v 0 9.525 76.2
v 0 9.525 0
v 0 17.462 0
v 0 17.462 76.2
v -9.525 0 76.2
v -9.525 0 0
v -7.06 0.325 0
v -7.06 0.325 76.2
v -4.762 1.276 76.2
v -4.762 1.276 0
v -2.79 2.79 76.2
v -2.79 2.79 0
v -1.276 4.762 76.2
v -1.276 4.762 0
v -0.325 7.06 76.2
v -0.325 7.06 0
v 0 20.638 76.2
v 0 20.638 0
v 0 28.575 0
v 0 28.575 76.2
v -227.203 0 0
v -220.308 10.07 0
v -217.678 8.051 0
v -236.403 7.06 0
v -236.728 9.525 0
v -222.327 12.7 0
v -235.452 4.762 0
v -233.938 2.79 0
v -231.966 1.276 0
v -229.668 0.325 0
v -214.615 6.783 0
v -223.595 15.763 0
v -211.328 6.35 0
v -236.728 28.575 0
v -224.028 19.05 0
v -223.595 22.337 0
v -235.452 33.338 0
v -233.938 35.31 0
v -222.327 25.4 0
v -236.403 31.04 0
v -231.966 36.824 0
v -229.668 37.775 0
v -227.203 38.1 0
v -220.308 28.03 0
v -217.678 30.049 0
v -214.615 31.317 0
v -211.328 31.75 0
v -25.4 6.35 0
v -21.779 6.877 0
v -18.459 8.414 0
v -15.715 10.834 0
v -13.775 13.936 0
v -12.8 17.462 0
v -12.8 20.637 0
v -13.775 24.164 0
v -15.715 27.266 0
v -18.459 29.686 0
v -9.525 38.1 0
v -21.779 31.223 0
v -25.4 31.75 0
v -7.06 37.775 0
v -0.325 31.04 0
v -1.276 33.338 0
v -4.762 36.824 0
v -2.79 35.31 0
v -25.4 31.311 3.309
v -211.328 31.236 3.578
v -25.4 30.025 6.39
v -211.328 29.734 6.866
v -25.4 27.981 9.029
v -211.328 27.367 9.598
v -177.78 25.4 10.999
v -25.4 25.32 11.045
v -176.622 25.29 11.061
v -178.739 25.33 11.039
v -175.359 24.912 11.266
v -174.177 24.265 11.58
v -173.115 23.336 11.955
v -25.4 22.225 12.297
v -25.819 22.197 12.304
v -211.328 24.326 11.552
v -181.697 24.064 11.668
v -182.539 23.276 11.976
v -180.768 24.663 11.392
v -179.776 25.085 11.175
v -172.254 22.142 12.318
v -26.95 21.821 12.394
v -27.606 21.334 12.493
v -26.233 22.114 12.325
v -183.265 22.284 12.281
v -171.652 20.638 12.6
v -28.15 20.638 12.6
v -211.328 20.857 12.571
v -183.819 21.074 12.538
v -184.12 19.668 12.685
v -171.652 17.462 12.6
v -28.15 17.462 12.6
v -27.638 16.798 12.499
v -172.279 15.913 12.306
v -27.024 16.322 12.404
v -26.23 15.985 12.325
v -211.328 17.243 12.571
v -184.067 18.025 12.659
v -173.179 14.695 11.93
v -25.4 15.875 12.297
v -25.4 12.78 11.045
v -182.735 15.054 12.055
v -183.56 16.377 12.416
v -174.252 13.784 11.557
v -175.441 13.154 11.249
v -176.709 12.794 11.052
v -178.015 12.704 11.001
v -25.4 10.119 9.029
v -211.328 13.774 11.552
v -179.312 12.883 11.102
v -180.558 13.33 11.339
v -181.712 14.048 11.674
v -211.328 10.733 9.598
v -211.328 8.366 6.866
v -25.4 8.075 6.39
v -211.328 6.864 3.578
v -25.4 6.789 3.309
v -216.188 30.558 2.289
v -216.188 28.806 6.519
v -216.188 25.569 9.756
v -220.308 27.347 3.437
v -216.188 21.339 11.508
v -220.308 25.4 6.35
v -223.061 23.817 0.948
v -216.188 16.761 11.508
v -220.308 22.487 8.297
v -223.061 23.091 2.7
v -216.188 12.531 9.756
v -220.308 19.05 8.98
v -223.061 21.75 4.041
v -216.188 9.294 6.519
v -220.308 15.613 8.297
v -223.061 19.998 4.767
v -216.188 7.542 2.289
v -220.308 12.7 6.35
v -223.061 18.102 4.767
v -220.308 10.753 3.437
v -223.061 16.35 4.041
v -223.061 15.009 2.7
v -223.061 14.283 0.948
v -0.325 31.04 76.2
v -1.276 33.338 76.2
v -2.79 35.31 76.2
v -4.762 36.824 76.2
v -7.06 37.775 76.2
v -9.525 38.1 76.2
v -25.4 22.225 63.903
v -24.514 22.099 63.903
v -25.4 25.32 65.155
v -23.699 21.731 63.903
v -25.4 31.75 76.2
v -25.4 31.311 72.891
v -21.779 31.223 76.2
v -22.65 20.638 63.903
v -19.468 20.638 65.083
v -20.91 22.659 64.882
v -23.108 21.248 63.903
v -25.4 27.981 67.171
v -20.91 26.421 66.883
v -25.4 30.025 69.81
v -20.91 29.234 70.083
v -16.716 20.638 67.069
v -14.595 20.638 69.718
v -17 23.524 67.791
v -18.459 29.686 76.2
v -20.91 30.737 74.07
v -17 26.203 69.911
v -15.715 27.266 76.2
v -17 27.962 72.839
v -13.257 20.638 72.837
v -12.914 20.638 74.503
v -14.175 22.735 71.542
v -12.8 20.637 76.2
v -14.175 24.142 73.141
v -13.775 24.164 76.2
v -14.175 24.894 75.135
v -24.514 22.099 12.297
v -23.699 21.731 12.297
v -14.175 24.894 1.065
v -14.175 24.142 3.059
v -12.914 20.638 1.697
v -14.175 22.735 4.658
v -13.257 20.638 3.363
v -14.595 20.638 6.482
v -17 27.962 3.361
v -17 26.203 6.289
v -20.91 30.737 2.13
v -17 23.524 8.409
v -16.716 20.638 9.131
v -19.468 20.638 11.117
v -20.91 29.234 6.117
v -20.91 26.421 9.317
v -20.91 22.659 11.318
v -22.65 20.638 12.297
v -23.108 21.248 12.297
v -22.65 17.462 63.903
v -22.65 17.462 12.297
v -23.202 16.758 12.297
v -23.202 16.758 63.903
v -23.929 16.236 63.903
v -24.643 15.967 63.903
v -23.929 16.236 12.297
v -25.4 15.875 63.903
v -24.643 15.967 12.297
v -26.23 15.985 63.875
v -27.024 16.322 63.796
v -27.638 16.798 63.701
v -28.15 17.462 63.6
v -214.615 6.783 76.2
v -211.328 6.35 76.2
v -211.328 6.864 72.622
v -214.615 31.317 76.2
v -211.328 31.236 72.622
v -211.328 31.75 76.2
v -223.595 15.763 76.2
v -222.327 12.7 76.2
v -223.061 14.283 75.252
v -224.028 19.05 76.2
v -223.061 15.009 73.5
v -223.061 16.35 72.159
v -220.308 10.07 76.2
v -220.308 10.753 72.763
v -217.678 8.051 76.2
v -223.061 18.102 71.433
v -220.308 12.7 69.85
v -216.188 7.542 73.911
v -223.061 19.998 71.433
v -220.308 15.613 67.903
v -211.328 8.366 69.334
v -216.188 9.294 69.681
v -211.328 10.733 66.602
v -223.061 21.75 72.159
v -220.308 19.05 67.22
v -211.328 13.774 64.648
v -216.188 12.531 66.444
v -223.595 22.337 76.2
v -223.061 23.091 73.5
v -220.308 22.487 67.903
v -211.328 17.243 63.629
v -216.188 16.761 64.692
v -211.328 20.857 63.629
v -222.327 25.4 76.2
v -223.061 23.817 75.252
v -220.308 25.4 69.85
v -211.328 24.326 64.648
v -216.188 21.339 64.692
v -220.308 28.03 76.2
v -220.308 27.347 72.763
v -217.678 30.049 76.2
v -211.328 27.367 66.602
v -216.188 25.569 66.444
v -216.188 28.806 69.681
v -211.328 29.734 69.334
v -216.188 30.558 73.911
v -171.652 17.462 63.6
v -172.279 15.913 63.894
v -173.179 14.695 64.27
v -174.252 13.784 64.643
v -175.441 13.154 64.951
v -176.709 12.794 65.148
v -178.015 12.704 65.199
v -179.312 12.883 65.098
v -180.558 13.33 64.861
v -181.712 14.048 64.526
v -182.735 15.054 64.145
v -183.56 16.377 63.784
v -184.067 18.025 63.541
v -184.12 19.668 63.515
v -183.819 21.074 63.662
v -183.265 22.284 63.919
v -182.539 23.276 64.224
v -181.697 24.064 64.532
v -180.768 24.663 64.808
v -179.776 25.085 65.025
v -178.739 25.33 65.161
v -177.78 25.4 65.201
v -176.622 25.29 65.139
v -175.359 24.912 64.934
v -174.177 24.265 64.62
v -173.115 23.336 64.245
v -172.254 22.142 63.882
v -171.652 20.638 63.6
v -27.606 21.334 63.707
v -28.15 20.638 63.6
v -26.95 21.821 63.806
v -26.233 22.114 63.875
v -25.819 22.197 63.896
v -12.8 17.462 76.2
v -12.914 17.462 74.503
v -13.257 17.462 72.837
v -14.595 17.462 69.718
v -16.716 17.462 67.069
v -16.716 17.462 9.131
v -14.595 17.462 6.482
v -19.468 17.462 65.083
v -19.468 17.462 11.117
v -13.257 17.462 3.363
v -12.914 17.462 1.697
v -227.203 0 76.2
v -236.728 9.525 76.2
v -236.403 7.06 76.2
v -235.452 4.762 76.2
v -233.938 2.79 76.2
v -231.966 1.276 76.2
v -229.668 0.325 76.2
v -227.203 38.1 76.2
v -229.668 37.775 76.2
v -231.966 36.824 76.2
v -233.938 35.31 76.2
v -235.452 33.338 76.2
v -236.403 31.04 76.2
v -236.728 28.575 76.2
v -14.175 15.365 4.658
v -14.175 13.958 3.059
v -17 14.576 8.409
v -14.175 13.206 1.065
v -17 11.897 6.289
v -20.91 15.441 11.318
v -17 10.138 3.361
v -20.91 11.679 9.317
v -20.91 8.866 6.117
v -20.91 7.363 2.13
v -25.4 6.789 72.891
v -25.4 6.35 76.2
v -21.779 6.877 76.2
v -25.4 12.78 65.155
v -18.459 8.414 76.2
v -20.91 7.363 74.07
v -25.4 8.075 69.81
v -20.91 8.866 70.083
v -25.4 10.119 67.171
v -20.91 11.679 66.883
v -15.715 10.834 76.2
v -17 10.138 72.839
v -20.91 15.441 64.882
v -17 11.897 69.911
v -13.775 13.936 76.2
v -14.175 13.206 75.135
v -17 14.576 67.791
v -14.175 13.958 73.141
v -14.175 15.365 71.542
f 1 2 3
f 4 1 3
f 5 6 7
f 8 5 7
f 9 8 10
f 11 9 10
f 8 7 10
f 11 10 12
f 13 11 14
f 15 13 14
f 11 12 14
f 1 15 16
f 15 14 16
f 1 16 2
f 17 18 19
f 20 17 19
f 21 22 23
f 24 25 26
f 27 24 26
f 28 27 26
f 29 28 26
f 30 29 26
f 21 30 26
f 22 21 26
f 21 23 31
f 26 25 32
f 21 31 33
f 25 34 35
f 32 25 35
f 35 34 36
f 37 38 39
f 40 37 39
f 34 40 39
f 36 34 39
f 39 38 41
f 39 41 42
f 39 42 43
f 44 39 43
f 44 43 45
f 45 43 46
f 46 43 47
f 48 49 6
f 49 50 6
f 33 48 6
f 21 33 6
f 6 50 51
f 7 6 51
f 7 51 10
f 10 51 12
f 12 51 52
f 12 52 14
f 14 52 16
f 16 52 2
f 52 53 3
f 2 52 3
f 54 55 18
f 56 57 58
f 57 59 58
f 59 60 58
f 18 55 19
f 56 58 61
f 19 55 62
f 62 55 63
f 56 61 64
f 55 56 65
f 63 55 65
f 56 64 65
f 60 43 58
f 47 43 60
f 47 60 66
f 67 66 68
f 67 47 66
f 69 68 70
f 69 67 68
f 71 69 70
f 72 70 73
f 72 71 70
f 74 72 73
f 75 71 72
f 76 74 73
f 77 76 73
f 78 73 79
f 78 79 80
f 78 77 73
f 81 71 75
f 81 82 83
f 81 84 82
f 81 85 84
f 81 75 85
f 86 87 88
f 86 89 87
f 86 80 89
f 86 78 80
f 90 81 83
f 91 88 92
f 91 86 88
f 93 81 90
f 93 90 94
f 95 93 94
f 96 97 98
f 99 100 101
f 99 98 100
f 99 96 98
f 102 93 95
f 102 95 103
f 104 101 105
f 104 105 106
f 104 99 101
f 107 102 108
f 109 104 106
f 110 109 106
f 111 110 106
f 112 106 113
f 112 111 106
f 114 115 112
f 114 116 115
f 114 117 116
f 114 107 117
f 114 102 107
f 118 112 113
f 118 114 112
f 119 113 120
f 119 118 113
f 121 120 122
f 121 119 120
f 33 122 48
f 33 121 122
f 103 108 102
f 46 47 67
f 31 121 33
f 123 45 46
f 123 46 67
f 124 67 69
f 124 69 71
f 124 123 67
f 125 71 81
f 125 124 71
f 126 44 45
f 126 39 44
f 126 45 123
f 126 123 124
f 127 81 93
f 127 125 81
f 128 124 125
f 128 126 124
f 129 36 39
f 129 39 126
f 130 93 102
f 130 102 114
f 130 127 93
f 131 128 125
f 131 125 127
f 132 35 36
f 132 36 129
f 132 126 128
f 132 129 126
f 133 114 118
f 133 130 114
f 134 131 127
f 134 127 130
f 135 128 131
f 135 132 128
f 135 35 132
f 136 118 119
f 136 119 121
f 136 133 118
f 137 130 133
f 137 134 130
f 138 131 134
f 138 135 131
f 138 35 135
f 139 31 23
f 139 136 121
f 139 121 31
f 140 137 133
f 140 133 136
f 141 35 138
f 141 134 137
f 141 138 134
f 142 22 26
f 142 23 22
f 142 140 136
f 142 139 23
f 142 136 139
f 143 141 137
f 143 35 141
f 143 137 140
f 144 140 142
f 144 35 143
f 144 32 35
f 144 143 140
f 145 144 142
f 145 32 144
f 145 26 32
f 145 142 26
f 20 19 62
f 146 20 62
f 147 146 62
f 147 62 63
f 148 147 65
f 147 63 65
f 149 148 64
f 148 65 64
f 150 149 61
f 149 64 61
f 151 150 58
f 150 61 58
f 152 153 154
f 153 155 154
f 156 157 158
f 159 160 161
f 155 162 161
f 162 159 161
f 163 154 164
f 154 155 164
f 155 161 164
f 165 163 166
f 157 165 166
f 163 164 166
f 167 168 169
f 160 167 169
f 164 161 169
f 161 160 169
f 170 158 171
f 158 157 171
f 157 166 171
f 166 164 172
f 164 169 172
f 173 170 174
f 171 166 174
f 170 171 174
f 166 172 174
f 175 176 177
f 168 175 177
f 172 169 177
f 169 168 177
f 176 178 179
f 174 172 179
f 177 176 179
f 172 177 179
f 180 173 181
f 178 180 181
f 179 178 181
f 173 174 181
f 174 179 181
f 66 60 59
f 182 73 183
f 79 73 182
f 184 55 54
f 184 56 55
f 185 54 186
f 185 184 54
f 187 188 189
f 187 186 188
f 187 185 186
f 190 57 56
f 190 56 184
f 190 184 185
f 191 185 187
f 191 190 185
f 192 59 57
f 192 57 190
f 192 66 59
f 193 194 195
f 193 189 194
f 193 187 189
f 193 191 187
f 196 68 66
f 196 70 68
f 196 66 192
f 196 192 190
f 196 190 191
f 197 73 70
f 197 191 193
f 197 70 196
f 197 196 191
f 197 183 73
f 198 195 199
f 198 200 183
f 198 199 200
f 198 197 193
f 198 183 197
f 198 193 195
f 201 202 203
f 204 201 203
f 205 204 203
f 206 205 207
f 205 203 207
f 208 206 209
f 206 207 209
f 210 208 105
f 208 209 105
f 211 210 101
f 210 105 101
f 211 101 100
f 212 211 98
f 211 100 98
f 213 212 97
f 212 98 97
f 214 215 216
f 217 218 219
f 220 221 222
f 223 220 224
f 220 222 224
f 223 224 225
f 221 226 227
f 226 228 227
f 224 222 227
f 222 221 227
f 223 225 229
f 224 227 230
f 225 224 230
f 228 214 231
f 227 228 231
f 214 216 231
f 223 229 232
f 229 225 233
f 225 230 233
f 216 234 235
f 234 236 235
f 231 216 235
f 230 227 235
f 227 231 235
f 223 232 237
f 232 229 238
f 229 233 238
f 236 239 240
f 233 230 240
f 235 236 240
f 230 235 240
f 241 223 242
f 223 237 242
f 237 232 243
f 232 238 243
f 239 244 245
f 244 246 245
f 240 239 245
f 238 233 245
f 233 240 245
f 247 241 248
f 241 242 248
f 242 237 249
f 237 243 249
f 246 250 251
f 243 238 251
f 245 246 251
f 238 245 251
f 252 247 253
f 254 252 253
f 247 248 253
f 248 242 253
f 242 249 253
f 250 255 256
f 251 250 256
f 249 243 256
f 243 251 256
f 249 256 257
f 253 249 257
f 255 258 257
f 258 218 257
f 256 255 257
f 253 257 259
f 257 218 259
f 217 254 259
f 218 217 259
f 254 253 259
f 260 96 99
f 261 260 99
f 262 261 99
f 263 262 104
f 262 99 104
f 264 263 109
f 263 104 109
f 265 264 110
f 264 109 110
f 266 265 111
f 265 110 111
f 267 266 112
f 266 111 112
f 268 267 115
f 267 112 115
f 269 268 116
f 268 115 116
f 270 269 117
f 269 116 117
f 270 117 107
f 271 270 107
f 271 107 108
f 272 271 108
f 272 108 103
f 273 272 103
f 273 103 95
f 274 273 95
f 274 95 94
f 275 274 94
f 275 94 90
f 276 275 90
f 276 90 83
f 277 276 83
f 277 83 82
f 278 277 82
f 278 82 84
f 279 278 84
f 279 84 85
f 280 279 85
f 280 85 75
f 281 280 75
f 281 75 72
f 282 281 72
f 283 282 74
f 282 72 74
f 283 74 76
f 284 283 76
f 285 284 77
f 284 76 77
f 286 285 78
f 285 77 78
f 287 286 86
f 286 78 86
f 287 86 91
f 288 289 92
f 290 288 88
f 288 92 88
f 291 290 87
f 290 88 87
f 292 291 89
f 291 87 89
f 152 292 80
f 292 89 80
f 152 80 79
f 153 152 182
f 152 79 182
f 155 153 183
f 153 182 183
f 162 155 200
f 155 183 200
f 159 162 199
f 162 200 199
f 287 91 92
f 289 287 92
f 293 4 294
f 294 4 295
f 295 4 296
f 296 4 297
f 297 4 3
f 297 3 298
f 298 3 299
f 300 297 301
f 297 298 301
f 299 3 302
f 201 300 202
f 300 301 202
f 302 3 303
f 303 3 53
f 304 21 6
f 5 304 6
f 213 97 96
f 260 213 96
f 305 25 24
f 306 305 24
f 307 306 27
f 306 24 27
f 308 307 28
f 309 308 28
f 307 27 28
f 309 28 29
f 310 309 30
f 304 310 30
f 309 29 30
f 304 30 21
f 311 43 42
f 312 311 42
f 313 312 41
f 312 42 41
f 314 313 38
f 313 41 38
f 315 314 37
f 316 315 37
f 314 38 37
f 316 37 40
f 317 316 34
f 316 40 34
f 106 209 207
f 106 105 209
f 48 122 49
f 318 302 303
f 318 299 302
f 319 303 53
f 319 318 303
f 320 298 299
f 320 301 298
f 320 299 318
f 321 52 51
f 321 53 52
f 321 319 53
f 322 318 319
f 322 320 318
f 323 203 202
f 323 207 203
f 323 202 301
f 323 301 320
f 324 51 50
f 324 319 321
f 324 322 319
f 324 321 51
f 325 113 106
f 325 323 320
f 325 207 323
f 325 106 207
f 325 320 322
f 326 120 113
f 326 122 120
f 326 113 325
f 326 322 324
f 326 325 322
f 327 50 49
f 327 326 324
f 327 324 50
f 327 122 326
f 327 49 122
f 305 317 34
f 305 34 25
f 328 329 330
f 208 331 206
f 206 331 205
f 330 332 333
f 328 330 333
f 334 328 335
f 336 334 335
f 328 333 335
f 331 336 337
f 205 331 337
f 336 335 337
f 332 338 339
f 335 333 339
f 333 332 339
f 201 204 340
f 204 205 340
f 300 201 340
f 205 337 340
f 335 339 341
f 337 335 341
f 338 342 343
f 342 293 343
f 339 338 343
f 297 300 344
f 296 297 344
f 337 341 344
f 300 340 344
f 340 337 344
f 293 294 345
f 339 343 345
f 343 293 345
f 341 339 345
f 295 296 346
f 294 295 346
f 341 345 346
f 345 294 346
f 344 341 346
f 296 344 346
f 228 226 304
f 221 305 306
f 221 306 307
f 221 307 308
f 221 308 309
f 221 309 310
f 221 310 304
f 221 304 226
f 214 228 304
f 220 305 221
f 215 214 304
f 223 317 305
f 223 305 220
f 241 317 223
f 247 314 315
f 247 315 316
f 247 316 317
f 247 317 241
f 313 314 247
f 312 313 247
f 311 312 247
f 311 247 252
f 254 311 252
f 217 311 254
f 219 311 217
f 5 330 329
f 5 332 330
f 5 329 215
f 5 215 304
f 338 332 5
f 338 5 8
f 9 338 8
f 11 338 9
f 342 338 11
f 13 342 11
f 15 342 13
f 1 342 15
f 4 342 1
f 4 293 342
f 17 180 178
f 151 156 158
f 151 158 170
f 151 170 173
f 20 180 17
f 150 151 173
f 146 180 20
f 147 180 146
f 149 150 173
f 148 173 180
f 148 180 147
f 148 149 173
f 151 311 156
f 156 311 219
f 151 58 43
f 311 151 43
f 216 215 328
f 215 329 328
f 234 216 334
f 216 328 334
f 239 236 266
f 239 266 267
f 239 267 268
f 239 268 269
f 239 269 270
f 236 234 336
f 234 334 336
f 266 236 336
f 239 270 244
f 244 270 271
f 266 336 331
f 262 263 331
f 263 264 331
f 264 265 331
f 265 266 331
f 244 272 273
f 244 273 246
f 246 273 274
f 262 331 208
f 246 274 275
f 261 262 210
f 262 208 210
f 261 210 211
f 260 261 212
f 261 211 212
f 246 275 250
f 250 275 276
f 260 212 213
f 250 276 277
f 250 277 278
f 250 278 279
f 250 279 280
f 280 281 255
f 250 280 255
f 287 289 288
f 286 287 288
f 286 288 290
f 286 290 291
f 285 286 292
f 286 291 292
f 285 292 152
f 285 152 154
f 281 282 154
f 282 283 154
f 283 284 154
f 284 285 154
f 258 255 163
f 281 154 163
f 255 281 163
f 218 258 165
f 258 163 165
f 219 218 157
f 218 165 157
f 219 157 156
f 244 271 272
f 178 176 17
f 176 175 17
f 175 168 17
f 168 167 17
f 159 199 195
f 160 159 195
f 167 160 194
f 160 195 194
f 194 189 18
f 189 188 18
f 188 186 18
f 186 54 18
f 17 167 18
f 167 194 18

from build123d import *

# Parameters (mm, degrees)
BOSS_EXTRUDE1_DEPTH = 76.2


with BuildPart() as part:
    # Sketch1 → Boss-Extrude1 (new body)
    with BuildSketch(Plane.XY):
        with BuildLine():
            Line((0, 20.6375), (0, 28.575))
            ThreePointArc((0, 28.575), (-2.789807909, 35.310192091), (-9.525, 38.1))
            Line((-9.525, 38.1), (-227.203, 38.1))
            ThreePointArc((-227.203, 38.1), (-233.938192091, 35.310192091), (-236.728, 28.575))
            Line((-236.728, 28.575), (-236.728, 9.525))
            ThreePointArc((-236.728, 9.525), (-233.938192091, 2.789807909), (-227.203, 0))
            Line((-227.203, 0), (-9.525, 0))
            ThreePointArc((-9.525, 0), (-2.789807909, 2.789807909), (0, 9.525))
            Line((0, 9.525), (0, 17.4625))
            Line((0, 17.4625), (-22.650369343, 17.4625))
            ThreePointArc((-22.650369343, 17.4625), (-25.4, 15.875), (-28.149630657, 17.4625))
            Line((-28.149630657, 17.4625), (-171.651638938, 17.4625))
            ThreePointArc((-171.651638938, 17.4625), (-184.15, 19.05), (-171.651638938, 20.6375))
            Line((-171.651638938, 20.6375), (-28.149630657, 20.6375))
            ThreePointArc((-28.149630657, 20.6375), (-25.4, 22.225), (-22.650369343, 20.6375))
            Line((-22.650369343, 20.6375), (0, 20.6375))
        make_face()
    extrude(amount=BOSS_EXTRUDE1_DEPTH)

    # Sketch2 → Cut-Revolve1 (revolve, cut)
    with BuildSketch(Plane.XY.offset(76.2)):
        with BuildLine():
            Line((-211.328, 31.75), (-25.4, 31.75))
            ThreePointArc((-25.4, 31.75), (-16.419743879, 28.030256121), (-12.7, 19.05))
            Line((-12.7, 19.05), (-224.028, 19.05))
            ThreePointArc((-224.028, 19.05), (-220.308256121, 28.030256121), (-211.328, 31.75))
        make_face()
    revolve(axis=Axis((-224.028, 19.05, 76.2), (1, 0, 0)), mode=Mode.SUBTRACT)

    # Sketch4 → Cut-Revolve3 (revolve, cut)
    with BuildSketch(Plane(origin=(0, 0, 0), x_dir=(-1, 0, 0), z_dir=(0, 0, -1))):
        with BuildLine():
            Line((25.4, 31.75), (211.328, 31.75))
            ThreePointArc((211.328, 31.75), (220.308256121, 28.030256121), (224.028, 19.05))
            Line((224.028, 19.05), (12.7, 19.05))
            ThreePointArc((12.7, 19.05), (16.419743879, 28.030256121), (25.4, 31.75))
        make_face()
    revolve(axis=Axis((-224.028, 19.05, 0), (1, 0, 0)), mode=Mode.SUBTRACT)


solid = part.part
